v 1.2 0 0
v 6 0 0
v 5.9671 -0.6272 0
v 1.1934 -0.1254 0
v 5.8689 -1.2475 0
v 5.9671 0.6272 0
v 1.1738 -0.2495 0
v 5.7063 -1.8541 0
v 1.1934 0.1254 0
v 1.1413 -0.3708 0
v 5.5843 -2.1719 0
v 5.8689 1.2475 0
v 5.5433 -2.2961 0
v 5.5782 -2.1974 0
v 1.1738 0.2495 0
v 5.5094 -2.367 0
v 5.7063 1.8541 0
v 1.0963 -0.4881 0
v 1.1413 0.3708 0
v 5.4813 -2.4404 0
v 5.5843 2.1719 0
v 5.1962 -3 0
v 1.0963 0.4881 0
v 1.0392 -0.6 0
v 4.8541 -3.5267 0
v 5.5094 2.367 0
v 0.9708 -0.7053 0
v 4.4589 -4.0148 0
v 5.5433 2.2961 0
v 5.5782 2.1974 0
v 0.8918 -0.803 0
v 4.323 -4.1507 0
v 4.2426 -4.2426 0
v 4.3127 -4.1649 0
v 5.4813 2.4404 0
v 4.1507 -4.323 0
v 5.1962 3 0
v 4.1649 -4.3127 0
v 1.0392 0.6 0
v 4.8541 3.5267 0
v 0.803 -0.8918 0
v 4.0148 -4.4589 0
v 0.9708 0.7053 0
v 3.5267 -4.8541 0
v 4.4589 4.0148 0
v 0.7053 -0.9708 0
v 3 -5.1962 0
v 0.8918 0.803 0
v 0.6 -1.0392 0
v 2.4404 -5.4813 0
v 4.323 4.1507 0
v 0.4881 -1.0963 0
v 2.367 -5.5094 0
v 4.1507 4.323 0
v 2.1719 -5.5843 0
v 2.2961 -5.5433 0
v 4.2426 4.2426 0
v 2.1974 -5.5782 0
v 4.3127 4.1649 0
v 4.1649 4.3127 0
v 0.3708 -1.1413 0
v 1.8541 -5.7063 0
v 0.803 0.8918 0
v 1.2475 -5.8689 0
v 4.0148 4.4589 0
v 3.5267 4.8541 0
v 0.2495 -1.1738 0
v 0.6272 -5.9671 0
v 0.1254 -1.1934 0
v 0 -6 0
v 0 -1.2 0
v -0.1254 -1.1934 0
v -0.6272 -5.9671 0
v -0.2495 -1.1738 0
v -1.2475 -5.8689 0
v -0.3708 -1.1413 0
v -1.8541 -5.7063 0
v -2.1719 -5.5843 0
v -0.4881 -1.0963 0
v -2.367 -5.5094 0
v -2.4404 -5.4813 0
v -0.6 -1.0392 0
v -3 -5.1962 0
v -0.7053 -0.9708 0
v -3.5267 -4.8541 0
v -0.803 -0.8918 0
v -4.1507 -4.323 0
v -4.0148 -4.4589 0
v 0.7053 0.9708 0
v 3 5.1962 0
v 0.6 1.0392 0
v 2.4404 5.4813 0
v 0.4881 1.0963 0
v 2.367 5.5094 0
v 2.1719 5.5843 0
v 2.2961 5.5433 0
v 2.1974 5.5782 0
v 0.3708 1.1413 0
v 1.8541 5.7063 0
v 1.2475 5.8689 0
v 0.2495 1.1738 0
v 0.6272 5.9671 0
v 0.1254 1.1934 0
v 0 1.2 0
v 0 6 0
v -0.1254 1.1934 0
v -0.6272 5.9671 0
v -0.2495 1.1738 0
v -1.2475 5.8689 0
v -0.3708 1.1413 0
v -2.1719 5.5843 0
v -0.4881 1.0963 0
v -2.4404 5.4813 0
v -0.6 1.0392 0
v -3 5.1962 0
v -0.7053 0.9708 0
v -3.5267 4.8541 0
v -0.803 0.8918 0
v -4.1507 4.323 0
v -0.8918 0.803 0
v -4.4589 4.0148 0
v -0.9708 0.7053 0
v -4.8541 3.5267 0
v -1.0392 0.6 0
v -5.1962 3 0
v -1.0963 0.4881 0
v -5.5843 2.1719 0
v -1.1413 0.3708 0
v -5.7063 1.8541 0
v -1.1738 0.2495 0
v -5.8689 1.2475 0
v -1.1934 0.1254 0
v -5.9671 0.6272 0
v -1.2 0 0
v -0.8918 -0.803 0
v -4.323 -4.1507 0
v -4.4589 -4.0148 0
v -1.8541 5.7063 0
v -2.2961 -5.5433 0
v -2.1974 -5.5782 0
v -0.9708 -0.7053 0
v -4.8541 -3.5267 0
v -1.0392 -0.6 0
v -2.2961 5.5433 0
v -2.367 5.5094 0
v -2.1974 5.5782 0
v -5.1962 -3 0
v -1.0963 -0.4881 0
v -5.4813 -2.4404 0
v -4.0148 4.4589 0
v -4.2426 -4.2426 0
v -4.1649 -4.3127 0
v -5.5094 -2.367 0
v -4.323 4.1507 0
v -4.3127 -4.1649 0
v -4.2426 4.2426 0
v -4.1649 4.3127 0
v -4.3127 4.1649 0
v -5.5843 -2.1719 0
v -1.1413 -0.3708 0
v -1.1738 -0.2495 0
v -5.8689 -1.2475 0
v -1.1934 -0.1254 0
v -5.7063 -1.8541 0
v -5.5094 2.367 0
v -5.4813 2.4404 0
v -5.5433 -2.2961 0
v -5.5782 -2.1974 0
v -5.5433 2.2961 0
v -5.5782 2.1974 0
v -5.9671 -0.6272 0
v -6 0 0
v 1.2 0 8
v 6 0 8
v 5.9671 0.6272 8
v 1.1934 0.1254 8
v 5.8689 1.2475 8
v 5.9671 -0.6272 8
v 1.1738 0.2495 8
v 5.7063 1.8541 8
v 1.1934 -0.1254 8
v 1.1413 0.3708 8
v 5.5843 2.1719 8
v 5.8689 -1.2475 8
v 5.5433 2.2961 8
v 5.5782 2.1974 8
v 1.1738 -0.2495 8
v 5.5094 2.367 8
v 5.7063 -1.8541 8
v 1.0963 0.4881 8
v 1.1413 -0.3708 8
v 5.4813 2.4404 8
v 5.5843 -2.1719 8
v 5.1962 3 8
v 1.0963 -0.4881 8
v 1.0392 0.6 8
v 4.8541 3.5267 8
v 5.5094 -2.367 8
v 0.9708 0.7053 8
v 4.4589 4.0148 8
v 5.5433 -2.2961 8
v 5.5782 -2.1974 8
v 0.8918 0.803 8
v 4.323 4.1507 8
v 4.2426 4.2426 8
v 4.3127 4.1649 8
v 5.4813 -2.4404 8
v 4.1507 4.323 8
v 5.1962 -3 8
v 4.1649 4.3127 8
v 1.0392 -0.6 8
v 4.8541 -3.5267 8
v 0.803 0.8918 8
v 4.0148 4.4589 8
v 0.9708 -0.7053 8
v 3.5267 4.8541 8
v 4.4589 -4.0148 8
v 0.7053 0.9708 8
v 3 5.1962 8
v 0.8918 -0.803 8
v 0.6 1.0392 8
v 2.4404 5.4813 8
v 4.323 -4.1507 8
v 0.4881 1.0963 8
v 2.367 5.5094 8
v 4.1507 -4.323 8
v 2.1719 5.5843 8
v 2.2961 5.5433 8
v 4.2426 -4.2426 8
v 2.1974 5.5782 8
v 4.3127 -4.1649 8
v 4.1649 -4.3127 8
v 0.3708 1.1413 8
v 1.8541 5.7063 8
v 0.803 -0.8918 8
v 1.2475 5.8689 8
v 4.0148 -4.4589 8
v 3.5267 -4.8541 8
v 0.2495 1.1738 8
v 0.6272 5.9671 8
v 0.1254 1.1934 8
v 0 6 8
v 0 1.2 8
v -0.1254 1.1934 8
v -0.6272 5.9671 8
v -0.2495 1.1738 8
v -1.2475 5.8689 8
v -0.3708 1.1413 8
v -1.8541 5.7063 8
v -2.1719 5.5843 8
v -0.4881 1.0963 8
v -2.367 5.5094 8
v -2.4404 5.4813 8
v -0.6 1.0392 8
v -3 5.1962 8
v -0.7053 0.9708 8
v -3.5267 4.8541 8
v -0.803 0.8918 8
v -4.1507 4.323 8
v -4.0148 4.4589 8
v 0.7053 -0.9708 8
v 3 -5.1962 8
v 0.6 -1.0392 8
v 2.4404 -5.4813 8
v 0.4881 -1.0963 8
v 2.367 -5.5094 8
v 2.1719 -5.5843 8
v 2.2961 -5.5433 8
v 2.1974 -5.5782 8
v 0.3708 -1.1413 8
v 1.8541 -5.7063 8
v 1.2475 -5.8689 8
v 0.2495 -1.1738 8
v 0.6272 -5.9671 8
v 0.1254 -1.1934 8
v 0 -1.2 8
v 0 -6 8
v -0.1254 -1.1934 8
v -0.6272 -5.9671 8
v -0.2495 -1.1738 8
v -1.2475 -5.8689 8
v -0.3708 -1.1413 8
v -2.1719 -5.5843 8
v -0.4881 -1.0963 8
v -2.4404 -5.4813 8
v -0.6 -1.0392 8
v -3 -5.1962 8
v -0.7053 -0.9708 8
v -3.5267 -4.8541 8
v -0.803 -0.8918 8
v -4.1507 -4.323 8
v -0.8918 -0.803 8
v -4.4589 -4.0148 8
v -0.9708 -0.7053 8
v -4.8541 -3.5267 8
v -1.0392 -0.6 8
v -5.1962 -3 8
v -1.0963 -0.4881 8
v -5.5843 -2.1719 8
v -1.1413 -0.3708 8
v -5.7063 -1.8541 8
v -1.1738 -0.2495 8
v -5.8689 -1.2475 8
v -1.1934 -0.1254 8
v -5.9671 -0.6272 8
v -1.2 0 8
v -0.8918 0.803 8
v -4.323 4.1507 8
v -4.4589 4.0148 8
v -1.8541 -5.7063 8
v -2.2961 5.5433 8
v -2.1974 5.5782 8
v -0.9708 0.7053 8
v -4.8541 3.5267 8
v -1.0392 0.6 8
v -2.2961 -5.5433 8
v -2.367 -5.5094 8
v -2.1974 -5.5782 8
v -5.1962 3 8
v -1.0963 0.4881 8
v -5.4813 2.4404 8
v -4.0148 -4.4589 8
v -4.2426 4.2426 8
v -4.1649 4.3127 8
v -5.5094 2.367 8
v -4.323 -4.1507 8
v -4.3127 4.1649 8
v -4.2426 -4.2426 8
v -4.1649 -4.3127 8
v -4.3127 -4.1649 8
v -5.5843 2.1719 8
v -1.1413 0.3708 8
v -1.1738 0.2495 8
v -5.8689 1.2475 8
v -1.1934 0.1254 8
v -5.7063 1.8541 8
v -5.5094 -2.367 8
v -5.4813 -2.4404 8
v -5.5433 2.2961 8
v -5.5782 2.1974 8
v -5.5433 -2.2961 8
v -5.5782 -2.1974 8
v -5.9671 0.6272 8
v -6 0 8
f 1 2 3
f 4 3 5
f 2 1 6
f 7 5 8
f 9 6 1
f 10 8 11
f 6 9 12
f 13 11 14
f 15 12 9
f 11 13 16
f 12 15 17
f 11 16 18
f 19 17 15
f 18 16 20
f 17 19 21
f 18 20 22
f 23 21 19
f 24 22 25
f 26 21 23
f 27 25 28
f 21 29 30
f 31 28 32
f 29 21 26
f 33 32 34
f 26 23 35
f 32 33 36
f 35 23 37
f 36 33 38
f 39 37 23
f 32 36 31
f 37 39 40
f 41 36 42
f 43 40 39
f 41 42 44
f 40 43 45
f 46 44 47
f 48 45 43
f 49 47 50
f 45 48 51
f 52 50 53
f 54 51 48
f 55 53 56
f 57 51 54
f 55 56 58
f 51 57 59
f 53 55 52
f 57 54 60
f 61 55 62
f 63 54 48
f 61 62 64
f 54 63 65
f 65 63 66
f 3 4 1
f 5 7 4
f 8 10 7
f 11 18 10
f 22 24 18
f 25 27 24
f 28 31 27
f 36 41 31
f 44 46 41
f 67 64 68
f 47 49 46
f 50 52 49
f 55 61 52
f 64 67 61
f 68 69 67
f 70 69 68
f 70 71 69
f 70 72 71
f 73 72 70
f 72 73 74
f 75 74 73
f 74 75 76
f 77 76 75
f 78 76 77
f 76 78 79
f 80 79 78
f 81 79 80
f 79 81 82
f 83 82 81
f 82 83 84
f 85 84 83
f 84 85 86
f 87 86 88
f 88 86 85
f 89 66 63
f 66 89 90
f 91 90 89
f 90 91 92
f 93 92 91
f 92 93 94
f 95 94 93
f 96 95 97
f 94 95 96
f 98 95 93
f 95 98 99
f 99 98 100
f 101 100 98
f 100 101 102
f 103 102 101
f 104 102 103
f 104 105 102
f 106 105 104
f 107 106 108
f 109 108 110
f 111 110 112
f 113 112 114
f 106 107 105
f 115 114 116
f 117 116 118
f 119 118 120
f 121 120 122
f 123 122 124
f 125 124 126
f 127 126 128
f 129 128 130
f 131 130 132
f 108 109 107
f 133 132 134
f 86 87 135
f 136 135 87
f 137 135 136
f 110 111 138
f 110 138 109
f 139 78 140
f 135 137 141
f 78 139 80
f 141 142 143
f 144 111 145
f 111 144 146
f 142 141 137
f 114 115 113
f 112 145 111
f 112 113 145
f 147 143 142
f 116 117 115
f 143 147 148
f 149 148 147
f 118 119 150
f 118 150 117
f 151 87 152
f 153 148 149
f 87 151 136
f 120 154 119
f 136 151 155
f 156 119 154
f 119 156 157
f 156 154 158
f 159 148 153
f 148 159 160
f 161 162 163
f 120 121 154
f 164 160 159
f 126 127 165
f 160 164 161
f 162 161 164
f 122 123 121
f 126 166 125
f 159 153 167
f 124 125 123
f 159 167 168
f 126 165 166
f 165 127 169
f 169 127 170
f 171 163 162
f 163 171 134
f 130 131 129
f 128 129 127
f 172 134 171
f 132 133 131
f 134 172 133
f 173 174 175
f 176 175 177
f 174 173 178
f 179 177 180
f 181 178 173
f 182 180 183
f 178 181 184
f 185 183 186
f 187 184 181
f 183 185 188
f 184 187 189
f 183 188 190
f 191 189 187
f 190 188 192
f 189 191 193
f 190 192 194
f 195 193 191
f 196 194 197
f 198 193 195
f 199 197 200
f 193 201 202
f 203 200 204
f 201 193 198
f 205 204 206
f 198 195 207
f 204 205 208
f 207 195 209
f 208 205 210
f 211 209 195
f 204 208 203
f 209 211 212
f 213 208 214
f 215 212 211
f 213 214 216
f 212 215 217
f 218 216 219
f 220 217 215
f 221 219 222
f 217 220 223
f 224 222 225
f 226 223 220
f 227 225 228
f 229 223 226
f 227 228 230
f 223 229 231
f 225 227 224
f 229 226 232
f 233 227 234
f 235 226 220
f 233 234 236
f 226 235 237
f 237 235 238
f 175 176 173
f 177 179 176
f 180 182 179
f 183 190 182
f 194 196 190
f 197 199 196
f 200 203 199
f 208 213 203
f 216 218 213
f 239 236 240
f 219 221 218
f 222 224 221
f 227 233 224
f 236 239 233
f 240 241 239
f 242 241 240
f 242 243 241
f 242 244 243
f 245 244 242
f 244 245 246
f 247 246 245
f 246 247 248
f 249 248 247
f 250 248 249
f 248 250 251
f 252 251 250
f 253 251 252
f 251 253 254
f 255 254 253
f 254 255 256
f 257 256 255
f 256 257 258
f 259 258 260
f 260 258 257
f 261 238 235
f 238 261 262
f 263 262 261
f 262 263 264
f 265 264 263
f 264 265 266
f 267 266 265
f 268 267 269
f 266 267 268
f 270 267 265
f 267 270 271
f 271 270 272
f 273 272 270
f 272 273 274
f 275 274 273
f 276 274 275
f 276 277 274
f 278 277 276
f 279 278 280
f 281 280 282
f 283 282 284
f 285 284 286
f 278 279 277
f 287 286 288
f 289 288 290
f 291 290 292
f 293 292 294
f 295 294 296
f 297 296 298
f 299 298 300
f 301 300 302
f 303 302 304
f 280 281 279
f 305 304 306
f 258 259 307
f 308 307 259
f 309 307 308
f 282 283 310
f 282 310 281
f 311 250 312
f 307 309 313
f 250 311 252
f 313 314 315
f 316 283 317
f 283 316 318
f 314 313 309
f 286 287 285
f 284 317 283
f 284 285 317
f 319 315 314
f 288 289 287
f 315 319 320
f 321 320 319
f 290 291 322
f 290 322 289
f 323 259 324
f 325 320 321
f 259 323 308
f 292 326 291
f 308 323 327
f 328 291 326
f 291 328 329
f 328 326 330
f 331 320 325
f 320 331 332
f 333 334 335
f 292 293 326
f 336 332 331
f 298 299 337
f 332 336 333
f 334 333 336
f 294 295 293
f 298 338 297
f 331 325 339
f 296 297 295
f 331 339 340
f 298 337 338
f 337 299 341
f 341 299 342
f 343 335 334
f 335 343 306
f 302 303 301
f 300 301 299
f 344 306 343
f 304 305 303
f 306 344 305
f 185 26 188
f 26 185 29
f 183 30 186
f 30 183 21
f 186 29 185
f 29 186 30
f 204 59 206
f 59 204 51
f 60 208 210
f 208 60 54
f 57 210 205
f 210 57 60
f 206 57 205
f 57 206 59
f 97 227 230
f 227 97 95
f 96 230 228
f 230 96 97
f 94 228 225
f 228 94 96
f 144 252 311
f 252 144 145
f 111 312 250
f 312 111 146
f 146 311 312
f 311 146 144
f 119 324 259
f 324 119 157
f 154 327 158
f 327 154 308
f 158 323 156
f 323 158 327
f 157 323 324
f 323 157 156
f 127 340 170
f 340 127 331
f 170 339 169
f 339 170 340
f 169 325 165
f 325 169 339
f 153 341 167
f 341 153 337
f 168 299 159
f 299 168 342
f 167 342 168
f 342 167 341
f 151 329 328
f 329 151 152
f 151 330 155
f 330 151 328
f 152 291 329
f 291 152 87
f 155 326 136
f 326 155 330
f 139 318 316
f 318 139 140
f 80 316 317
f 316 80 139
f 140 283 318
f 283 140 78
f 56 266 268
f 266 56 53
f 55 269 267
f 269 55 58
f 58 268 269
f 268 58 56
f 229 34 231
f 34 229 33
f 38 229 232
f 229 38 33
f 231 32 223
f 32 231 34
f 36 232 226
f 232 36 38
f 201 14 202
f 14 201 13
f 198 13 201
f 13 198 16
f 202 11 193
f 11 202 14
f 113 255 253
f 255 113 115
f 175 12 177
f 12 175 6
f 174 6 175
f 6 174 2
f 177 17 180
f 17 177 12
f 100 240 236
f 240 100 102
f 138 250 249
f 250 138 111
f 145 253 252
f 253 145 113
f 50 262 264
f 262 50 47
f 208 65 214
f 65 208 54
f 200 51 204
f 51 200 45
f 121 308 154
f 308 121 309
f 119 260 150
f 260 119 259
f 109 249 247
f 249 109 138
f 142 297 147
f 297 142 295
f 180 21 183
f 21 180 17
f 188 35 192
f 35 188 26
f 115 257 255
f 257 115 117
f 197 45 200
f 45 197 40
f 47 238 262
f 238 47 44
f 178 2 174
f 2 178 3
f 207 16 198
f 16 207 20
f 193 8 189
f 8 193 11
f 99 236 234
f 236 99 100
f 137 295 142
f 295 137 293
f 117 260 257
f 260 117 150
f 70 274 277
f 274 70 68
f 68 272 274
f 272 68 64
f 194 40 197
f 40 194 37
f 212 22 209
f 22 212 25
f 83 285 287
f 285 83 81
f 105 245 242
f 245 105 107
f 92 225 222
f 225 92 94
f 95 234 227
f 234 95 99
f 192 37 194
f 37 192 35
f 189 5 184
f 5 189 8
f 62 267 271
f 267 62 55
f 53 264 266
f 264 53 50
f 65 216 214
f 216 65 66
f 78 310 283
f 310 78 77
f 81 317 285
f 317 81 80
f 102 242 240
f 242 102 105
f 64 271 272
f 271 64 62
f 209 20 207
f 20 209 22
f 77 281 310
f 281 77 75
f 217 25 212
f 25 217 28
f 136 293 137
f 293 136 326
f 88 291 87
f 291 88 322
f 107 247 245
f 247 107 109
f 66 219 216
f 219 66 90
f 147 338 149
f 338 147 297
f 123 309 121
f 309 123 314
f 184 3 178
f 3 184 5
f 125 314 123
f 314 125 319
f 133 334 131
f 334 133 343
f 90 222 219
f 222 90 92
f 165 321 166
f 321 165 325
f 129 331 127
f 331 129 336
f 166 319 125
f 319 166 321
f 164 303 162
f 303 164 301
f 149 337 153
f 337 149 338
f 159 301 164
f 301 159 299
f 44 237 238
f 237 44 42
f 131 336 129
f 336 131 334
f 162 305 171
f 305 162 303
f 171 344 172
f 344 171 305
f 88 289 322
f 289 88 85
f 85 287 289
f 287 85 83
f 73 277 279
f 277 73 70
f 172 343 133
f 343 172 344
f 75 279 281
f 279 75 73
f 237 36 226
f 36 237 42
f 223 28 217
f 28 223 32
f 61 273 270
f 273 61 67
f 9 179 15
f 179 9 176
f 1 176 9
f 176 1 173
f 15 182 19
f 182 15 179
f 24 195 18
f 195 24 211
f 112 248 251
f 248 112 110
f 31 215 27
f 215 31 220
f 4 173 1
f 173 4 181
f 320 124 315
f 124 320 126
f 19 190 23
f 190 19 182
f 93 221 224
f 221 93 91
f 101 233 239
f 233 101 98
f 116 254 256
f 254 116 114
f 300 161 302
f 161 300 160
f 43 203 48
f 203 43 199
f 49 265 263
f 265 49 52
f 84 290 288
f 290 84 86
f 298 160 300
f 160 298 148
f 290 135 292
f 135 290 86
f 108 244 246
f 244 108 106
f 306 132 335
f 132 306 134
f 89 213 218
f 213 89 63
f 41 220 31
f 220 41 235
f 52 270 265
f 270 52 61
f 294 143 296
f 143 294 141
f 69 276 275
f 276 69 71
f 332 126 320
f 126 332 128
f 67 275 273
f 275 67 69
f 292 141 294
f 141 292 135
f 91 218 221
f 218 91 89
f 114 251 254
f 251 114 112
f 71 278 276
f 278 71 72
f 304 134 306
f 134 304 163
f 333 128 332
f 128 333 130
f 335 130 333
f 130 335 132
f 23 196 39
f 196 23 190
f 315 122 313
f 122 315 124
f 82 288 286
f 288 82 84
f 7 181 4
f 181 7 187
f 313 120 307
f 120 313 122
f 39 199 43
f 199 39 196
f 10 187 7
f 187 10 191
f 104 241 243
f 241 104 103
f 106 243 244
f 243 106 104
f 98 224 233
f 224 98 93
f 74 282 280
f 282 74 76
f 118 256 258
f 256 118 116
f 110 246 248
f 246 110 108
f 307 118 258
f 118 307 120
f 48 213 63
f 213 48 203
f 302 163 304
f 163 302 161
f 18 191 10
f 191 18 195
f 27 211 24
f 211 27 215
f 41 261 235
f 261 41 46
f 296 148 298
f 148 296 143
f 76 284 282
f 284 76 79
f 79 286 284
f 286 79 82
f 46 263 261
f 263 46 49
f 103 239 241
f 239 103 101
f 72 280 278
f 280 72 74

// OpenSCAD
// Threaded hand knob.
$fn = 60;
eps = 0.02;
thread_d = 2.4;
knob_d = 12;
knob_h = 8;
difference() {
    union() {
        cylinder(d=knob_d,h=knob_h);
        for(i=[0:15]) rotate([0,0,i*22.5]) translate([knob_d/2-1,0,0]) cylinder(d=2,h=knob_h);
    }
    translate([0,0,-eps]) cylinder(d=thread_d,h=knob_h+2*eps);
}
